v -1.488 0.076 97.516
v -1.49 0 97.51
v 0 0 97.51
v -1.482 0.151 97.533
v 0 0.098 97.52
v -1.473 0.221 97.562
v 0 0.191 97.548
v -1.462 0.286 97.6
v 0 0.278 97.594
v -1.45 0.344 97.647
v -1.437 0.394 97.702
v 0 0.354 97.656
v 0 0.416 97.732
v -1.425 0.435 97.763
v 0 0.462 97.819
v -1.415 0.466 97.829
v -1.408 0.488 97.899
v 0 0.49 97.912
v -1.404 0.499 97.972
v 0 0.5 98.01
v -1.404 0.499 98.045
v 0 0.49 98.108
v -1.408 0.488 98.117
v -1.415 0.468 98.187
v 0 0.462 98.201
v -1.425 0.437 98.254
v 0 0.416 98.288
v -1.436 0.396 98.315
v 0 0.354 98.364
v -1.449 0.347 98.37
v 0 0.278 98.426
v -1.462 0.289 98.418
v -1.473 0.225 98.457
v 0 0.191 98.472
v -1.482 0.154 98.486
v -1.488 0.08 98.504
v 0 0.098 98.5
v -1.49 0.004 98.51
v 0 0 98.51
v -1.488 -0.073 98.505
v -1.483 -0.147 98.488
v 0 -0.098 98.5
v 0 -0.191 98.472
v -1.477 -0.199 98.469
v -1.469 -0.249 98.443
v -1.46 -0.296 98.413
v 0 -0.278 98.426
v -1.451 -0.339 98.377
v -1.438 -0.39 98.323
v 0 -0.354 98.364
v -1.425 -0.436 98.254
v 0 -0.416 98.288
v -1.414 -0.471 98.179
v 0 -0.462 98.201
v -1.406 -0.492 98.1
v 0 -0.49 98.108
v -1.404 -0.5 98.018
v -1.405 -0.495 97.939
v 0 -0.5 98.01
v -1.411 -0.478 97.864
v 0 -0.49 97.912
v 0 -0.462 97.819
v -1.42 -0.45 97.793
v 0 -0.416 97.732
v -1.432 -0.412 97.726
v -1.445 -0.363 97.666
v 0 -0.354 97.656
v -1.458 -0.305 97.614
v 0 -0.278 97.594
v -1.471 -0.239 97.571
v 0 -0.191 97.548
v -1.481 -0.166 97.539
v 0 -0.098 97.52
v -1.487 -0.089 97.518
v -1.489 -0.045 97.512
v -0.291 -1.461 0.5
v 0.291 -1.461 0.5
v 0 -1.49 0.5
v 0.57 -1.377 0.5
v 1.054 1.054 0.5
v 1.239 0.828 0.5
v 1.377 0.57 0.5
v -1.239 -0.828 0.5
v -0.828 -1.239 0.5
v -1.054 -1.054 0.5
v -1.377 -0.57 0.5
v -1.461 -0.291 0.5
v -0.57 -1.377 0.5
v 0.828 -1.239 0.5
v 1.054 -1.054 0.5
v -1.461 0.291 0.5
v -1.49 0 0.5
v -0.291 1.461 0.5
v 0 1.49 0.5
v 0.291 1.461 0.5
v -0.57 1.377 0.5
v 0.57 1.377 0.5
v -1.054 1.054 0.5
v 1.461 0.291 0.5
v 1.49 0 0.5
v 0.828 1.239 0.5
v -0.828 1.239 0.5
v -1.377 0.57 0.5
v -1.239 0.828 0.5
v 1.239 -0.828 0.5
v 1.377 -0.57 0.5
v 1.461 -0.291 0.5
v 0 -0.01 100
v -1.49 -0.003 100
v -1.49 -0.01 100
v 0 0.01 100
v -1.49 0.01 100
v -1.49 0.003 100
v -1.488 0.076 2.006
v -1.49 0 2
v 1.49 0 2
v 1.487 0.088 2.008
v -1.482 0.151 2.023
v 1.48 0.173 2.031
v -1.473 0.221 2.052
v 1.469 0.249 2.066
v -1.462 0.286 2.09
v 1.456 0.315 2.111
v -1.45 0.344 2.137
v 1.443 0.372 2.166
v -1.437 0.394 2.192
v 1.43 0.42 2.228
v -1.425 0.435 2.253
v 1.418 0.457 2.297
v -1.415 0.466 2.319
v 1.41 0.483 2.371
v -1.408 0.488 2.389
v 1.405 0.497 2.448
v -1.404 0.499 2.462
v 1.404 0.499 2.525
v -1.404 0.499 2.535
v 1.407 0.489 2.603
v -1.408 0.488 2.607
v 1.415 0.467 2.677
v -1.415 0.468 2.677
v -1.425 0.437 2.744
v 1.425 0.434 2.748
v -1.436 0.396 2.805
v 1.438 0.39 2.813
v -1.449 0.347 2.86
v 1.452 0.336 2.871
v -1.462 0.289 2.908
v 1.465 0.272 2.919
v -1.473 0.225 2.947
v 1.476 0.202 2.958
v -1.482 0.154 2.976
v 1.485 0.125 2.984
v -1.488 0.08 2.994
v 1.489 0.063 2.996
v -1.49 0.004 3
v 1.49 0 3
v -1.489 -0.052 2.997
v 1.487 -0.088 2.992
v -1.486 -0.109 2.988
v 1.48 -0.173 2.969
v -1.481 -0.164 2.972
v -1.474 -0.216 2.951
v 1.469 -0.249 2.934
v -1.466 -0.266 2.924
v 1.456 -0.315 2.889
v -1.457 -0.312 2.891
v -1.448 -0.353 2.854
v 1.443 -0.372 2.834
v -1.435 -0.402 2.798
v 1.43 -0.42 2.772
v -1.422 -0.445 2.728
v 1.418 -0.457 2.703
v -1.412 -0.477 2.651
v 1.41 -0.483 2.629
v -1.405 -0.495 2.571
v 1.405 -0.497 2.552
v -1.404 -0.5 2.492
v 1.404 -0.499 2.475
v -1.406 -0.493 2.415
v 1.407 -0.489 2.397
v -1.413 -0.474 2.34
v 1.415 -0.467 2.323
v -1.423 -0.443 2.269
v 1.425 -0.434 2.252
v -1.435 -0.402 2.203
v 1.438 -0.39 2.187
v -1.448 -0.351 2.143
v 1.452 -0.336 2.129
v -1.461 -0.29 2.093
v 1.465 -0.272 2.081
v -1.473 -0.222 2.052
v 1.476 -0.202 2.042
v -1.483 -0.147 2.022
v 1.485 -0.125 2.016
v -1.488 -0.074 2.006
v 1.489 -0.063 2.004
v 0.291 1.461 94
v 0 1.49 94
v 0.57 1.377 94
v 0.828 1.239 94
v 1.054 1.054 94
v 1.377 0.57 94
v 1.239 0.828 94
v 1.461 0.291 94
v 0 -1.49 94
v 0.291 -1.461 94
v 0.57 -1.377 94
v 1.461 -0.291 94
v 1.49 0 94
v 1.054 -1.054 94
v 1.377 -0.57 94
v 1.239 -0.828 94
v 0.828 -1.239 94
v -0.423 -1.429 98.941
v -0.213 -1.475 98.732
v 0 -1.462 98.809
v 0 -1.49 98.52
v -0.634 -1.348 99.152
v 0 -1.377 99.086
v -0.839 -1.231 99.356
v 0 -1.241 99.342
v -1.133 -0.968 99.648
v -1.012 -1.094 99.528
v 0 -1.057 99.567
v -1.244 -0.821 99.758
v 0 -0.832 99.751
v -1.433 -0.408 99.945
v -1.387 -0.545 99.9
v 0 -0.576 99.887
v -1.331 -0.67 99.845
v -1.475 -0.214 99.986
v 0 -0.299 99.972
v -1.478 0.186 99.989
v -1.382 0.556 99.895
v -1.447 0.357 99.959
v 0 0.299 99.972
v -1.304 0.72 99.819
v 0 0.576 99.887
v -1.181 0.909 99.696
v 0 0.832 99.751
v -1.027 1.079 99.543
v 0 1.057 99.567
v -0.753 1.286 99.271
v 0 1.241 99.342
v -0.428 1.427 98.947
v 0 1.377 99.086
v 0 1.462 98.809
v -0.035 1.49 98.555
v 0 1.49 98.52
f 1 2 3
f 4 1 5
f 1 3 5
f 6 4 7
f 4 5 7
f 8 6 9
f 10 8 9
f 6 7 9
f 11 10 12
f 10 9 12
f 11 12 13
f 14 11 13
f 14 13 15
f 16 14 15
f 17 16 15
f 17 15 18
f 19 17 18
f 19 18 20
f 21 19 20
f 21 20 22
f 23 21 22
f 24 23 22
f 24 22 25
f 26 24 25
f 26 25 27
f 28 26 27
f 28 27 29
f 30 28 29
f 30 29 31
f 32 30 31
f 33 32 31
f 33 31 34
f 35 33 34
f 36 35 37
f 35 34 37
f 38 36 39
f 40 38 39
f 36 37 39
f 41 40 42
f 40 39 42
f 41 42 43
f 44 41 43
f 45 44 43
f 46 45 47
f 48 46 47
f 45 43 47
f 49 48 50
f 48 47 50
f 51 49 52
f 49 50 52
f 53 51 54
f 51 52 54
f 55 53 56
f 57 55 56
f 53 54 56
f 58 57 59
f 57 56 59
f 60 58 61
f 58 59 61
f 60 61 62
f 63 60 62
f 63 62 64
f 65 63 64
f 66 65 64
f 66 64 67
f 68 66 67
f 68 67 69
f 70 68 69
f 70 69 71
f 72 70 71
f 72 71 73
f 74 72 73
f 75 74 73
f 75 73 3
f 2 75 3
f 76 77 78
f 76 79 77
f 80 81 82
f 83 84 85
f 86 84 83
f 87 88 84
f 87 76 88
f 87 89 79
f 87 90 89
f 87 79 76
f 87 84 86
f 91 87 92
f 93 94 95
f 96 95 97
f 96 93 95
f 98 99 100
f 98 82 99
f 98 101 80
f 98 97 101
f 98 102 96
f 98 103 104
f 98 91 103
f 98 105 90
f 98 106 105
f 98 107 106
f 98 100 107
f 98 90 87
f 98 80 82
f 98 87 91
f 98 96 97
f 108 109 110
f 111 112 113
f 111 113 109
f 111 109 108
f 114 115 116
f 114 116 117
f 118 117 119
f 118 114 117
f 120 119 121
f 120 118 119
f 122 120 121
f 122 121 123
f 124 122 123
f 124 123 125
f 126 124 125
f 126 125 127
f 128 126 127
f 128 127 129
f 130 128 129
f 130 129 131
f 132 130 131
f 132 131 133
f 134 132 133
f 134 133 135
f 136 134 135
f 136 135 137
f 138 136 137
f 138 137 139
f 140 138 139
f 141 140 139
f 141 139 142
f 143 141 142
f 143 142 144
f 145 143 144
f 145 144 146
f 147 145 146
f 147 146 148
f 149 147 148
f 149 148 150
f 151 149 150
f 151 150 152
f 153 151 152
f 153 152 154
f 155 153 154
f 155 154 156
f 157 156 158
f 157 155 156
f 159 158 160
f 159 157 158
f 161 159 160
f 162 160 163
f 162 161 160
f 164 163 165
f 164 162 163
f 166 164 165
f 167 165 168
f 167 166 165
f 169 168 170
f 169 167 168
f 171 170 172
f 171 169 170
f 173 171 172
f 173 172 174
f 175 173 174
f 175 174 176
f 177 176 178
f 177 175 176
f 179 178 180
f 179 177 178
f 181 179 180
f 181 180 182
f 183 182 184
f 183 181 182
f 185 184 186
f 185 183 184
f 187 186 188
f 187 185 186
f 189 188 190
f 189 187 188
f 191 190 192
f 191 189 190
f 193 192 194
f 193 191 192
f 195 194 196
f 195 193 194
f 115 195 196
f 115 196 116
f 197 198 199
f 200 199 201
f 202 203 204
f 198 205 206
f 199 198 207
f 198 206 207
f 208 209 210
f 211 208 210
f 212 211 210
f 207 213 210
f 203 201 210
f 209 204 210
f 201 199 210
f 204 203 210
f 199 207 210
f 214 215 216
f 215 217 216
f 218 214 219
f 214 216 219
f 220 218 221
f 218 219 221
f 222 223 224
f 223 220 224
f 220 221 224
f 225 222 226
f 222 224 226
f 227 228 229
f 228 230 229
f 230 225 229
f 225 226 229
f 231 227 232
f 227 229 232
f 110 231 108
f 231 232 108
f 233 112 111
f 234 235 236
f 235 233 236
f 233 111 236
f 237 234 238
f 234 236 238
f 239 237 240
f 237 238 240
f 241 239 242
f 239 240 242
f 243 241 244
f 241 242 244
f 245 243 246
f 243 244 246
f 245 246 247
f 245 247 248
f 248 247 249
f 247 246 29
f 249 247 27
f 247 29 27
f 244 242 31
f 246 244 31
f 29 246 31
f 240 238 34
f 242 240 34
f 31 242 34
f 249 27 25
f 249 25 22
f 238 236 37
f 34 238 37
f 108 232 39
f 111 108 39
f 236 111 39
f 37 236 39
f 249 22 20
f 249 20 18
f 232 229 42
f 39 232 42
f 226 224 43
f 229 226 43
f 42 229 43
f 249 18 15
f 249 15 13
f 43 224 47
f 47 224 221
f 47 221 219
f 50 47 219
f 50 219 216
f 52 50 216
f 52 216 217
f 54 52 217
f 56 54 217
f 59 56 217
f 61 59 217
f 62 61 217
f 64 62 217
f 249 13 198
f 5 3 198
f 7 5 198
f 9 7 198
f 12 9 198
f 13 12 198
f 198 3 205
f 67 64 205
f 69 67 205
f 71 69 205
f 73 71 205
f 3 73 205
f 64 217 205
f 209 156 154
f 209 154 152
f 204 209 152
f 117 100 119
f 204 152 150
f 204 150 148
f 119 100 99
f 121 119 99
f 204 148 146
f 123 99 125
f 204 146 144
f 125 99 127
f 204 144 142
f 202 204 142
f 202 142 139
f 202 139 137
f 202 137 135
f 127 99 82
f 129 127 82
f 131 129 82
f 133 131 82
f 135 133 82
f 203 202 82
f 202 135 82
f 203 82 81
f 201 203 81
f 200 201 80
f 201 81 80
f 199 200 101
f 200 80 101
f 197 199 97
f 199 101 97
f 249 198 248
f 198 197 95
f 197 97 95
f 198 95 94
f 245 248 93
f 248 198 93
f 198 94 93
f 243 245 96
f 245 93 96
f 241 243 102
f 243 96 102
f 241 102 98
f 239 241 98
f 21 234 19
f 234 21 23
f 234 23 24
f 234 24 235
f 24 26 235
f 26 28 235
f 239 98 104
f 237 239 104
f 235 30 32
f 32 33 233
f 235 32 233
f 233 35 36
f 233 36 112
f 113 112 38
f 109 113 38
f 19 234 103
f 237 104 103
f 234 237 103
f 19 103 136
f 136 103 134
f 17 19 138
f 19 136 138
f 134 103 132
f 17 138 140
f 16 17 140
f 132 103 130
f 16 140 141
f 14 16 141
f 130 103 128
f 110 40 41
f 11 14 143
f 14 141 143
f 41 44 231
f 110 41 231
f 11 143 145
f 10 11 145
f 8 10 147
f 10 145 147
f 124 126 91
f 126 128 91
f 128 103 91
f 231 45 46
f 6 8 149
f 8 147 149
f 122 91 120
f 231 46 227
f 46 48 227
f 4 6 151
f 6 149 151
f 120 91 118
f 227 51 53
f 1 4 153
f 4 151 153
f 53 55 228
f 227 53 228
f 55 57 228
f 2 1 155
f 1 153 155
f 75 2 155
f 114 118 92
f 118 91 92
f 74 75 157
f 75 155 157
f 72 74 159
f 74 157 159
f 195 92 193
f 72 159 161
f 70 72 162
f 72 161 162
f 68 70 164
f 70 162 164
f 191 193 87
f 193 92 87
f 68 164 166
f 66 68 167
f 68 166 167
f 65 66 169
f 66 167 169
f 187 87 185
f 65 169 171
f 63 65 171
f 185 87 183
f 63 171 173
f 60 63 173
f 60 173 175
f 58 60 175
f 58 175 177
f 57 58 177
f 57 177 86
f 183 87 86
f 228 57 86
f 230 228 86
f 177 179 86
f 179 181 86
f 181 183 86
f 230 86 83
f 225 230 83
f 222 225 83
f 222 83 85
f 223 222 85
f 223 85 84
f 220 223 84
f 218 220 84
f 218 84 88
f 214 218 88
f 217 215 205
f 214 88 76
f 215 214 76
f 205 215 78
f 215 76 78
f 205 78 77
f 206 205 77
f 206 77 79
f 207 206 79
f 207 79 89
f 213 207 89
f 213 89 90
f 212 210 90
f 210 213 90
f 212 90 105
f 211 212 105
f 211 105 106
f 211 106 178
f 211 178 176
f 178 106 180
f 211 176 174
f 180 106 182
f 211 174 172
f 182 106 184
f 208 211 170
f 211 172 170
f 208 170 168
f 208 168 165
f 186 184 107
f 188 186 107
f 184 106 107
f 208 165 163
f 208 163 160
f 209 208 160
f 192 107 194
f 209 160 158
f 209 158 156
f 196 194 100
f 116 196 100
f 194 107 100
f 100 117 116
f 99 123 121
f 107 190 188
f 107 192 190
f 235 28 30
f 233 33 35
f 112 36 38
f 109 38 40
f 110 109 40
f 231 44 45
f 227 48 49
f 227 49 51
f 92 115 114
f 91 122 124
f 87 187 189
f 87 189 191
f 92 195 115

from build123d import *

# Parameters (mm, degrees)
SKETCH_1_R               = 1.49
EXTRUDE_1_DEPTH          = 100
CUT_EXTRUDE_3_DEPTH      = 101.022198536
CUT_EXTRUDE_3_DEPTH_BACK = 101.022198536
SKETCH_4_R               = 0.5
CUT_EXTRUDE_7_DEPTH      = 101.022198639
CUT_EXTRUDE_7_DEPTH_BACK = 101.022198639
SKETCH_2_W               = 1.49
SKETCH_2_H               = 6
SKETCH_6_R               = 0.5
CUT_EXTRUDE_8_DEPTH      = 10
SKETCH_7_R               = 1.49
CUT_EXTRUDE_9_DEPTH      = 0.5


with BuildPart() as part:
    # 草图1 → 凸台-拉伸1 (new body)
    with BuildSketch(Plane.XY):
        Circle(SKETCH_1_R)
    extrude(amount=EXTRUDE_1_DEPTH)

    # 草图4 → 切除-拉伸3 (cut, two sides: drawn at the far end of the back side and taken through both)
    with BuildSketch(Plane(origin=(0, 0, 0), x_dir=(0, 0, -1), z_dir=(1, 0, 0)).offset(-CUT_EXTRUDE_3_DEPTH_BACK)):
        with Locations((-2.5, 0)):
            Circle(SKETCH_4_R)
    extrude(amount=CUT_EXTRUDE_3_DEPTH + CUT_EXTRUDE_3_DEPTH_BACK, mode=Mode.SUBTRACT)

    # 草图2 → 切除-拉伸7 (cut, two sides: drawn at the far end of the back side and taken through both)
    with BuildSketch(Plane(origin=(0, 0, 0), x_dir=(1, 0, 0), z_dir=(0, 1, 0)).offset(-CUT_EXTRUDE_7_DEPTH_BACK)):
        with Locations((0.745, -97)):
            Rectangle(SKETCH_2_W, SKETCH_2_H)
    extrude(amount=CUT_EXTRUDE_7_DEPTH + CUT_EXTRUDE_7_DEPTH_BACK, mode=Mode.SUBTRACT)

    # 草图6 → 切除-拉伸8 (cut)
    with BuildSketch(Plane(origin=(0, 0, 0), x_dir=(0, 0, -1), z_dir=(1, 0, 0))):
        with BuildLine():
            Line((-100, 1.49), (-100, 0.01))
            ThreePointArc((-100, 0.01), (-99.566518036, 1.056518036), (-98.52, 1.49))
            Line((-98.52, 1.49), (-100, 1.49))
        make_face()
        with BuildLine():
            ThreePointArc((-98.52, -1.49), (-99.566518036, -1.056518036), (-100, -0.01))
            Line((-100, -0.01), (-100, -1.49))
            Line((-100, -1.49), (-98.52, -1.49))
        make_face()
        with Locations((-98.01, 0)):
            Circle(SKETCH_6_R)
    extrude(amount=-CUT_EXTRUDE_8_DEPTH, mode=Mode.SUBTRACT)

    # 草图7 → 切除-拉伸9 (cut)
    with BuildSketch(Plane(origin=(0, 0, 0), x_dir=(-1, 0, 0), z_dir=(0, 0, -1))):
        Circle(SKETCH_7_R)
    extrude(amount=-CUT_EXTRUDE_9_DEPTH, mode=Mode.SUBTRACT)


solid = part.part
